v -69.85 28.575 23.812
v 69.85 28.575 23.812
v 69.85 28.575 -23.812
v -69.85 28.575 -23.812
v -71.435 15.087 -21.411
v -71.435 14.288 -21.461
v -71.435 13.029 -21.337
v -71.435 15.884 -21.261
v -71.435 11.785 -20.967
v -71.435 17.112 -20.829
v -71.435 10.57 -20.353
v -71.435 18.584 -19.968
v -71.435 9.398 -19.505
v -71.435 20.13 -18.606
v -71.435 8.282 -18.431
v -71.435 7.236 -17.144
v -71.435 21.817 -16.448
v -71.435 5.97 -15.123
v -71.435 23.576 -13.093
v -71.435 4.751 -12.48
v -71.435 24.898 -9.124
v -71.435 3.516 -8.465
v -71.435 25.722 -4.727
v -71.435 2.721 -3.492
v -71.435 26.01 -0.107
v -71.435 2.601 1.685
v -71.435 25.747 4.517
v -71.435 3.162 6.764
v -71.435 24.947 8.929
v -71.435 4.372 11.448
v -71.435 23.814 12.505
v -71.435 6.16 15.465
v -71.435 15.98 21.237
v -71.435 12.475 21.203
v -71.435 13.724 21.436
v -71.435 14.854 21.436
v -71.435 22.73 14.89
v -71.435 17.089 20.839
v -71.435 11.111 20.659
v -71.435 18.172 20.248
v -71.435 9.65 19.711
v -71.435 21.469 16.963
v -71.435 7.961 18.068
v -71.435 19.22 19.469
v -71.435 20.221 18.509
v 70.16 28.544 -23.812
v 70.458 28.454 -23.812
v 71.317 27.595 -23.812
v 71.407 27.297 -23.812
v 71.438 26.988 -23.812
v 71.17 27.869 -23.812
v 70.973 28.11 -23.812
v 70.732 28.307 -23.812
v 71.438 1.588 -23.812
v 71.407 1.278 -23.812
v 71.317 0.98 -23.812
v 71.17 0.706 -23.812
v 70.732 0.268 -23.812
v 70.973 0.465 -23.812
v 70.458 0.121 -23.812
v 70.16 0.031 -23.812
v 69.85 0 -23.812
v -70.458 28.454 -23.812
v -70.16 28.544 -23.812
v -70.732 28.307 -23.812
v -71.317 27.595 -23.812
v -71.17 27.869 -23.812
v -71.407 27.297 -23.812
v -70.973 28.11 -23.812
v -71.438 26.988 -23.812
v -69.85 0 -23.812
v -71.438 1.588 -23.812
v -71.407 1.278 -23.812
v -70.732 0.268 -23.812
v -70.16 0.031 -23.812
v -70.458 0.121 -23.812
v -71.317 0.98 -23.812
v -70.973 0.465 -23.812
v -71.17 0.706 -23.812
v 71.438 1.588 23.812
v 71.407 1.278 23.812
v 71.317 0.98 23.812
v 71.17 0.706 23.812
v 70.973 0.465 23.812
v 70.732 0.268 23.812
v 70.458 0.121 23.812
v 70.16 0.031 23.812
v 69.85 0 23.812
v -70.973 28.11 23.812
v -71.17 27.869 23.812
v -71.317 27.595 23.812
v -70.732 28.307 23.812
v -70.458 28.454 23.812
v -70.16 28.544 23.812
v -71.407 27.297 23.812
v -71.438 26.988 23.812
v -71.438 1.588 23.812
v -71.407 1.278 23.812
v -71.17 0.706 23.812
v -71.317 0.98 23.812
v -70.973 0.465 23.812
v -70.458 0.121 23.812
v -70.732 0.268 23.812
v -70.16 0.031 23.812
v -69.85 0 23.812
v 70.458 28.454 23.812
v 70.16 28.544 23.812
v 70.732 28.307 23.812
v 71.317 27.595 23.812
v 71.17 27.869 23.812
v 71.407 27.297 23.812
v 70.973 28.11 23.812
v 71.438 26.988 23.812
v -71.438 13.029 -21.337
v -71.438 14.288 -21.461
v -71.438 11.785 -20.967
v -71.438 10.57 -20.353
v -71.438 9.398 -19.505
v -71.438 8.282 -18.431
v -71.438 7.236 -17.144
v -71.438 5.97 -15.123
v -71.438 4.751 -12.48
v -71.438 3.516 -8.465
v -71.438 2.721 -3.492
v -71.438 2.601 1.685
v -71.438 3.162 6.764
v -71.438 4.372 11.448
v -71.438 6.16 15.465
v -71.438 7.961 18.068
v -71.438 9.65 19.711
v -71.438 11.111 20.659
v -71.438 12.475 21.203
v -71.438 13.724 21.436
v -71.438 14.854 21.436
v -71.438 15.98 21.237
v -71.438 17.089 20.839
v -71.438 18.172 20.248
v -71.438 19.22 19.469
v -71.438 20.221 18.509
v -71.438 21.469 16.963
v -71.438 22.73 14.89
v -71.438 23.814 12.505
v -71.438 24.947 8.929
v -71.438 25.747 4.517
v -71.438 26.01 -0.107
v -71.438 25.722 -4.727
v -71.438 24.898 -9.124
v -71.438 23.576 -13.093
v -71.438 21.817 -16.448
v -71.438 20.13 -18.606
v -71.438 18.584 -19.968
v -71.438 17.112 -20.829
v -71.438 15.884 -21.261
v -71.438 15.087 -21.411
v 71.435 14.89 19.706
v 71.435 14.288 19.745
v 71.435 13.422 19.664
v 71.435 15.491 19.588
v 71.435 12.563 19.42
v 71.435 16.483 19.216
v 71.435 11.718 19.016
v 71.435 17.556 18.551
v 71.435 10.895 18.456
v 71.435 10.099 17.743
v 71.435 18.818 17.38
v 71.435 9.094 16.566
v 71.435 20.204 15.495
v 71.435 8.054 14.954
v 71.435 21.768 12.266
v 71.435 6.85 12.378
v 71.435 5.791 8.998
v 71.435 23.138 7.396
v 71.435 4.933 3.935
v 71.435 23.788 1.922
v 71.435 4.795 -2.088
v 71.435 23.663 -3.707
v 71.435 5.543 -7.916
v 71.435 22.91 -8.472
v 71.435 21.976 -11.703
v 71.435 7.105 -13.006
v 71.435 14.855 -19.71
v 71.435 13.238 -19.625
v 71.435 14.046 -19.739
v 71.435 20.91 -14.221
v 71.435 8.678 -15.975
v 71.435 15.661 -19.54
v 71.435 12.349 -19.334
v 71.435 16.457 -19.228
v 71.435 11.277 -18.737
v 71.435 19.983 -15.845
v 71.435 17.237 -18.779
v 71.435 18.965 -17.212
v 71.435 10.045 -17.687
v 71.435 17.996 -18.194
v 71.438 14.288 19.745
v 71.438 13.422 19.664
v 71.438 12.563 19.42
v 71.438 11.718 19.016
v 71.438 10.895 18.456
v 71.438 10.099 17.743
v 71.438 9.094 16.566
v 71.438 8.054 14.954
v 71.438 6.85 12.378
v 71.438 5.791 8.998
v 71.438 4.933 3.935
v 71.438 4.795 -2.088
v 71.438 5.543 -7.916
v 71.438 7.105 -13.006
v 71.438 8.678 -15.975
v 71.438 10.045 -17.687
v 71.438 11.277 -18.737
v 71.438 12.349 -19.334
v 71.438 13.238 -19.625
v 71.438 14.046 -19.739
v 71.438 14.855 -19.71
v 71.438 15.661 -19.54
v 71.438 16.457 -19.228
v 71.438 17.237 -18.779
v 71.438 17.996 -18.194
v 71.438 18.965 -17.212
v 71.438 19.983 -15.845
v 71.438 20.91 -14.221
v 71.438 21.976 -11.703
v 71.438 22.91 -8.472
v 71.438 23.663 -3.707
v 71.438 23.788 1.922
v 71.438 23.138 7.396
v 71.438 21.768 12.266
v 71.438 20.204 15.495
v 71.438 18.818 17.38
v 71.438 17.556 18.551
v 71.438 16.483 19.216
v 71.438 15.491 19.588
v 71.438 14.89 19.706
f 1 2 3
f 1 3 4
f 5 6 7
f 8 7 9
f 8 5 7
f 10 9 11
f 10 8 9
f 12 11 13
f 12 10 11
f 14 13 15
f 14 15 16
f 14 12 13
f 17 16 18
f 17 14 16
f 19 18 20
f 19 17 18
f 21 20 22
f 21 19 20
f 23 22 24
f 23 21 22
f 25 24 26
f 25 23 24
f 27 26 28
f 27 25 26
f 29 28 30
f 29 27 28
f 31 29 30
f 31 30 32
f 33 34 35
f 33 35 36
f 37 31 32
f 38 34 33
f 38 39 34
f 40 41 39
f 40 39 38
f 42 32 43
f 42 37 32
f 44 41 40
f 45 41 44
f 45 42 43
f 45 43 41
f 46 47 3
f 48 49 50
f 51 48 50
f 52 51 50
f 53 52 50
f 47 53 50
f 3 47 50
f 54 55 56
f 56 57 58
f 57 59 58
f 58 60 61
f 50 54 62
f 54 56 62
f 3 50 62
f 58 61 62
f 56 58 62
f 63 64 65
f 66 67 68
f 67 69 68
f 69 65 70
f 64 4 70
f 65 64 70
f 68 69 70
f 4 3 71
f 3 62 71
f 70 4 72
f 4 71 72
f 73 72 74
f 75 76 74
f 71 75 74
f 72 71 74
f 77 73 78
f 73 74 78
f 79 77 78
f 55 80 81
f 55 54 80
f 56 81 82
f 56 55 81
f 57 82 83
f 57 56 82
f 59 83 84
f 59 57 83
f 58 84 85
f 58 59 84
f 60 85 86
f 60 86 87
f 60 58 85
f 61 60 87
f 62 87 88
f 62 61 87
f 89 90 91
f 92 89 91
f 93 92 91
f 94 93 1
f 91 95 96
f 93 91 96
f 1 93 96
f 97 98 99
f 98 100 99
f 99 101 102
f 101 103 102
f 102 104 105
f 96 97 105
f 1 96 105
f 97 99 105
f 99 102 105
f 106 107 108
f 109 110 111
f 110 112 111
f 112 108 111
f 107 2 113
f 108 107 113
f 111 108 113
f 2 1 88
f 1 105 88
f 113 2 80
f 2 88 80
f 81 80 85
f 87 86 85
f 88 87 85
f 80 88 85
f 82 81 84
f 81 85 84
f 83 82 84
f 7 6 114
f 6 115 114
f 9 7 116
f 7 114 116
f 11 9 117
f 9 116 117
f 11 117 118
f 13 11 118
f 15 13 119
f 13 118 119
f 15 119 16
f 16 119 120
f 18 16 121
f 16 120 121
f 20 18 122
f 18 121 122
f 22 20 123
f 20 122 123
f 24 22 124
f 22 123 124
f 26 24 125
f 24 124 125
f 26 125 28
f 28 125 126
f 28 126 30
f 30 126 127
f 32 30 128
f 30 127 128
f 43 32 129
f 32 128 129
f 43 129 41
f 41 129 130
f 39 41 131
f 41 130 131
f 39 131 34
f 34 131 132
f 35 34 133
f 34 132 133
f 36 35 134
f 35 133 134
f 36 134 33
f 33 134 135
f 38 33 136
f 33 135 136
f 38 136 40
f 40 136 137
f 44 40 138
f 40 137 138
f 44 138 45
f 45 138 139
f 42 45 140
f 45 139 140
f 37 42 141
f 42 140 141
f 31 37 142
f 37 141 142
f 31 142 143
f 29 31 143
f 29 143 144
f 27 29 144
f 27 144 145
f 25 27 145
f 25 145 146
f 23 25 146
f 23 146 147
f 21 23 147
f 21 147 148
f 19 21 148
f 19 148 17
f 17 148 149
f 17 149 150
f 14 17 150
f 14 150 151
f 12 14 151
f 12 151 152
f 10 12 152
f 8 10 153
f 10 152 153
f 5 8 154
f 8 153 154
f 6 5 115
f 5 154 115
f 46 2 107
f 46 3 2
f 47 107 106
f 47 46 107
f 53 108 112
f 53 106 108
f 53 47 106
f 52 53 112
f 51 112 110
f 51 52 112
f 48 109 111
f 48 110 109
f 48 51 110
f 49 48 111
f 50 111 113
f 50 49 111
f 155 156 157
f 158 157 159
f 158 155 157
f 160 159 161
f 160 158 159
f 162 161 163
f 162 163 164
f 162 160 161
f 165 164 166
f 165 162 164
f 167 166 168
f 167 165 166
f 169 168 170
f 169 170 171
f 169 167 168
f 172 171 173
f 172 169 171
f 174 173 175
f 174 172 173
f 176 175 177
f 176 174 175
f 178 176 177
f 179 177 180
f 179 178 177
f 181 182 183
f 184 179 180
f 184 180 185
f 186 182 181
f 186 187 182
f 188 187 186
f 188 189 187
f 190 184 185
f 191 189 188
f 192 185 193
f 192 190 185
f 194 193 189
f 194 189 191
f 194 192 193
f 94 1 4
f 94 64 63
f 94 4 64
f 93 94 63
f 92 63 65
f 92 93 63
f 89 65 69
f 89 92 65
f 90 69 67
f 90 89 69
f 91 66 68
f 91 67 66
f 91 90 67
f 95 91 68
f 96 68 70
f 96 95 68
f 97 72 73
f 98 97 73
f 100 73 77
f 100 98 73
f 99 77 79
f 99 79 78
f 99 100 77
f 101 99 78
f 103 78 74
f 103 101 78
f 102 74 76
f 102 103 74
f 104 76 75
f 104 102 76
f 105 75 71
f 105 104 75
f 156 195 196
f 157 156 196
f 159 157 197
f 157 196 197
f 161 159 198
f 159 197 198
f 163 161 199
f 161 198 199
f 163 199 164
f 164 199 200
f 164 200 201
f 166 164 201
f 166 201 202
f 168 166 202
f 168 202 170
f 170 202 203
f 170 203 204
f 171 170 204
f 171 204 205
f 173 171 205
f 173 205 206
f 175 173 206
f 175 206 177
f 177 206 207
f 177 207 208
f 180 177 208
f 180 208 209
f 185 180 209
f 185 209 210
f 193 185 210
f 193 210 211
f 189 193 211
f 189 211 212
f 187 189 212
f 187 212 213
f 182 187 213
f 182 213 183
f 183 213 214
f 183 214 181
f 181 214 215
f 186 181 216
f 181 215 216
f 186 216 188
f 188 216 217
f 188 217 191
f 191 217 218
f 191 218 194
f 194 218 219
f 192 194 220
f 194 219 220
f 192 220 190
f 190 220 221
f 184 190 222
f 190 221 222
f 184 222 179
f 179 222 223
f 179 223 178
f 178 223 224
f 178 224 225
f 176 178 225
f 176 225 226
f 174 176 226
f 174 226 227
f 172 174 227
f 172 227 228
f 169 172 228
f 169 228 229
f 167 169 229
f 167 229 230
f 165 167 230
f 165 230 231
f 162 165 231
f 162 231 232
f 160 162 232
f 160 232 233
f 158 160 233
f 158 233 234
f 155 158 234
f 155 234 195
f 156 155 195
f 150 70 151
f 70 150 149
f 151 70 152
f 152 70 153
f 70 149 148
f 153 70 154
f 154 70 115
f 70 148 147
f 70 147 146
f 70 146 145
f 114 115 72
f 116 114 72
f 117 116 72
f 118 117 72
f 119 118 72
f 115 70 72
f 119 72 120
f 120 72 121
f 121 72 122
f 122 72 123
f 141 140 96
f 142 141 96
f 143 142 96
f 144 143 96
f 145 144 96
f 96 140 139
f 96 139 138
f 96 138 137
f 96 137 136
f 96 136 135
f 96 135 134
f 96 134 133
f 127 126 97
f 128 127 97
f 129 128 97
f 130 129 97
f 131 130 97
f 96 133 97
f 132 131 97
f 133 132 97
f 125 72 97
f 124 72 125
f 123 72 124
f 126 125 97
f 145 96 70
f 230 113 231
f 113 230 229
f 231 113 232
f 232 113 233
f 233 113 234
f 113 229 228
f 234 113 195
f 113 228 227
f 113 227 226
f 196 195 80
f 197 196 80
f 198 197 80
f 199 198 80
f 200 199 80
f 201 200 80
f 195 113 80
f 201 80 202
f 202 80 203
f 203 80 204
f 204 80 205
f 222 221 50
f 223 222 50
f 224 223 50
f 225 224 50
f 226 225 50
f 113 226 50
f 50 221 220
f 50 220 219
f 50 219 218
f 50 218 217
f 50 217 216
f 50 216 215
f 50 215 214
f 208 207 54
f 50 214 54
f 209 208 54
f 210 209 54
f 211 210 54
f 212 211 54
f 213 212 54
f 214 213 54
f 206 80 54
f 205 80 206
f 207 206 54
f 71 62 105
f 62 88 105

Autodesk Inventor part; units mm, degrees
ref_plane "YZ Plane" through (0, 0, 0) normal (1, 0, 0) x (0, 1, 0)
ref_plane "XZ Plane" through (0, 0, 0) normal (0, 1, 0) x (-1, 0, 0)
ref_plane "XY Plane" through (0, 0, 0) normal (0, 0, 1) x (1, 0, 0)
sketch "Sketch1" plane through (0, 0, 0) normal (0, 1, 0) x (-1, 0, 0)
  line L0 (71.4375, 23.8125) -> (-71.4375, 23.8125)
  line L1 (-71.4375, 23.8125) -> (-71.4375, -23.8125)
  line L2 (-71.4375, -23.8125) -> (71.4375, -23.8125)
  line L3 (71.4375, -23.8125) -> (71.4375, 23.8125)
  point P0 (0, 0)
  point P1 (71.4375, 0)
  point P2 (0, -23.8125)
  dimension "d0" = 142.875
  dimension "d1" = 47.625
extrude "Extrusion1" add sketch "Sketch1" along normal blind 28.575
fillet "Fillet1" radius 1.5875 4 edges at (71.4375, 28.575, 0) (71.4375, 0, 0) (-71.4375, 0, 0) (-71.4375, 28.575, 0)
sketch "Sketch2" plane through (71.4375, 1.5875, -23.8125) normal (1, 0, 0) x (0, 0, -1)
  line L0 (0, 0) -> (-47.625, 0) projected
  line L1 (0, 0) -> (0, 25.4) projected
  line L2 (-47.625, 25.4) -> (0, 25.4) projected
  line L3 (-47.625, 0) -> (-47.625, 25.4) projected
  ellipse E0 centre (-23.8125, 12.7) end of major axis (-43.5575, 12.7) minor radius 9.5456
  point P0 (-23.8125, -1.5875)
sketch "Sketch3" plane through (-71.4375, 1.5875, -23.8125) normal (-1, 0, 0) x (0, 0, 1)
  line L0 (0, 25.4) -> (47.625, 25.4) projected
  line L1 (0, 0) -> (0, 25.4) projected
  line L2 (47.625, 0) -> (0, 0) projected
  line L3 (47.625, 0) -> (47.625, 25.4) projected
  ellipse E0 centre (23.8125, 12.7) end of major axis (2.3512, 12.7) minor radius 11.7224
  point P0 (23.8125, -1.5875)
extrude "Extrusion2" cut sketch "Sketch2" against normal blind 0.0025 contours E0
extrude "Extrusion3" cut sketch "Sketch3" against normal blind 0.0025 contours E0
sketch "Sketch4" plane through (0, 28.575, 0) normal (0, 1, 0) x (1, 0, 0)
  line L0 (-67.8346, 19.1959) -> (69.1812, 19.1959) construction
  line L1 (69.1812, 19.1959) -> (69.1812, -17.2378) construction
  line L2 (69.1812, -17.2378) -> (-67.8346, -17.2378) construction
  line L3 (-67.8346, -17.2378) -> (-67.8346, 19.1959) construction
  point P0 (0, 0)
properties part number "Turnigy 4S 5200 mah"
